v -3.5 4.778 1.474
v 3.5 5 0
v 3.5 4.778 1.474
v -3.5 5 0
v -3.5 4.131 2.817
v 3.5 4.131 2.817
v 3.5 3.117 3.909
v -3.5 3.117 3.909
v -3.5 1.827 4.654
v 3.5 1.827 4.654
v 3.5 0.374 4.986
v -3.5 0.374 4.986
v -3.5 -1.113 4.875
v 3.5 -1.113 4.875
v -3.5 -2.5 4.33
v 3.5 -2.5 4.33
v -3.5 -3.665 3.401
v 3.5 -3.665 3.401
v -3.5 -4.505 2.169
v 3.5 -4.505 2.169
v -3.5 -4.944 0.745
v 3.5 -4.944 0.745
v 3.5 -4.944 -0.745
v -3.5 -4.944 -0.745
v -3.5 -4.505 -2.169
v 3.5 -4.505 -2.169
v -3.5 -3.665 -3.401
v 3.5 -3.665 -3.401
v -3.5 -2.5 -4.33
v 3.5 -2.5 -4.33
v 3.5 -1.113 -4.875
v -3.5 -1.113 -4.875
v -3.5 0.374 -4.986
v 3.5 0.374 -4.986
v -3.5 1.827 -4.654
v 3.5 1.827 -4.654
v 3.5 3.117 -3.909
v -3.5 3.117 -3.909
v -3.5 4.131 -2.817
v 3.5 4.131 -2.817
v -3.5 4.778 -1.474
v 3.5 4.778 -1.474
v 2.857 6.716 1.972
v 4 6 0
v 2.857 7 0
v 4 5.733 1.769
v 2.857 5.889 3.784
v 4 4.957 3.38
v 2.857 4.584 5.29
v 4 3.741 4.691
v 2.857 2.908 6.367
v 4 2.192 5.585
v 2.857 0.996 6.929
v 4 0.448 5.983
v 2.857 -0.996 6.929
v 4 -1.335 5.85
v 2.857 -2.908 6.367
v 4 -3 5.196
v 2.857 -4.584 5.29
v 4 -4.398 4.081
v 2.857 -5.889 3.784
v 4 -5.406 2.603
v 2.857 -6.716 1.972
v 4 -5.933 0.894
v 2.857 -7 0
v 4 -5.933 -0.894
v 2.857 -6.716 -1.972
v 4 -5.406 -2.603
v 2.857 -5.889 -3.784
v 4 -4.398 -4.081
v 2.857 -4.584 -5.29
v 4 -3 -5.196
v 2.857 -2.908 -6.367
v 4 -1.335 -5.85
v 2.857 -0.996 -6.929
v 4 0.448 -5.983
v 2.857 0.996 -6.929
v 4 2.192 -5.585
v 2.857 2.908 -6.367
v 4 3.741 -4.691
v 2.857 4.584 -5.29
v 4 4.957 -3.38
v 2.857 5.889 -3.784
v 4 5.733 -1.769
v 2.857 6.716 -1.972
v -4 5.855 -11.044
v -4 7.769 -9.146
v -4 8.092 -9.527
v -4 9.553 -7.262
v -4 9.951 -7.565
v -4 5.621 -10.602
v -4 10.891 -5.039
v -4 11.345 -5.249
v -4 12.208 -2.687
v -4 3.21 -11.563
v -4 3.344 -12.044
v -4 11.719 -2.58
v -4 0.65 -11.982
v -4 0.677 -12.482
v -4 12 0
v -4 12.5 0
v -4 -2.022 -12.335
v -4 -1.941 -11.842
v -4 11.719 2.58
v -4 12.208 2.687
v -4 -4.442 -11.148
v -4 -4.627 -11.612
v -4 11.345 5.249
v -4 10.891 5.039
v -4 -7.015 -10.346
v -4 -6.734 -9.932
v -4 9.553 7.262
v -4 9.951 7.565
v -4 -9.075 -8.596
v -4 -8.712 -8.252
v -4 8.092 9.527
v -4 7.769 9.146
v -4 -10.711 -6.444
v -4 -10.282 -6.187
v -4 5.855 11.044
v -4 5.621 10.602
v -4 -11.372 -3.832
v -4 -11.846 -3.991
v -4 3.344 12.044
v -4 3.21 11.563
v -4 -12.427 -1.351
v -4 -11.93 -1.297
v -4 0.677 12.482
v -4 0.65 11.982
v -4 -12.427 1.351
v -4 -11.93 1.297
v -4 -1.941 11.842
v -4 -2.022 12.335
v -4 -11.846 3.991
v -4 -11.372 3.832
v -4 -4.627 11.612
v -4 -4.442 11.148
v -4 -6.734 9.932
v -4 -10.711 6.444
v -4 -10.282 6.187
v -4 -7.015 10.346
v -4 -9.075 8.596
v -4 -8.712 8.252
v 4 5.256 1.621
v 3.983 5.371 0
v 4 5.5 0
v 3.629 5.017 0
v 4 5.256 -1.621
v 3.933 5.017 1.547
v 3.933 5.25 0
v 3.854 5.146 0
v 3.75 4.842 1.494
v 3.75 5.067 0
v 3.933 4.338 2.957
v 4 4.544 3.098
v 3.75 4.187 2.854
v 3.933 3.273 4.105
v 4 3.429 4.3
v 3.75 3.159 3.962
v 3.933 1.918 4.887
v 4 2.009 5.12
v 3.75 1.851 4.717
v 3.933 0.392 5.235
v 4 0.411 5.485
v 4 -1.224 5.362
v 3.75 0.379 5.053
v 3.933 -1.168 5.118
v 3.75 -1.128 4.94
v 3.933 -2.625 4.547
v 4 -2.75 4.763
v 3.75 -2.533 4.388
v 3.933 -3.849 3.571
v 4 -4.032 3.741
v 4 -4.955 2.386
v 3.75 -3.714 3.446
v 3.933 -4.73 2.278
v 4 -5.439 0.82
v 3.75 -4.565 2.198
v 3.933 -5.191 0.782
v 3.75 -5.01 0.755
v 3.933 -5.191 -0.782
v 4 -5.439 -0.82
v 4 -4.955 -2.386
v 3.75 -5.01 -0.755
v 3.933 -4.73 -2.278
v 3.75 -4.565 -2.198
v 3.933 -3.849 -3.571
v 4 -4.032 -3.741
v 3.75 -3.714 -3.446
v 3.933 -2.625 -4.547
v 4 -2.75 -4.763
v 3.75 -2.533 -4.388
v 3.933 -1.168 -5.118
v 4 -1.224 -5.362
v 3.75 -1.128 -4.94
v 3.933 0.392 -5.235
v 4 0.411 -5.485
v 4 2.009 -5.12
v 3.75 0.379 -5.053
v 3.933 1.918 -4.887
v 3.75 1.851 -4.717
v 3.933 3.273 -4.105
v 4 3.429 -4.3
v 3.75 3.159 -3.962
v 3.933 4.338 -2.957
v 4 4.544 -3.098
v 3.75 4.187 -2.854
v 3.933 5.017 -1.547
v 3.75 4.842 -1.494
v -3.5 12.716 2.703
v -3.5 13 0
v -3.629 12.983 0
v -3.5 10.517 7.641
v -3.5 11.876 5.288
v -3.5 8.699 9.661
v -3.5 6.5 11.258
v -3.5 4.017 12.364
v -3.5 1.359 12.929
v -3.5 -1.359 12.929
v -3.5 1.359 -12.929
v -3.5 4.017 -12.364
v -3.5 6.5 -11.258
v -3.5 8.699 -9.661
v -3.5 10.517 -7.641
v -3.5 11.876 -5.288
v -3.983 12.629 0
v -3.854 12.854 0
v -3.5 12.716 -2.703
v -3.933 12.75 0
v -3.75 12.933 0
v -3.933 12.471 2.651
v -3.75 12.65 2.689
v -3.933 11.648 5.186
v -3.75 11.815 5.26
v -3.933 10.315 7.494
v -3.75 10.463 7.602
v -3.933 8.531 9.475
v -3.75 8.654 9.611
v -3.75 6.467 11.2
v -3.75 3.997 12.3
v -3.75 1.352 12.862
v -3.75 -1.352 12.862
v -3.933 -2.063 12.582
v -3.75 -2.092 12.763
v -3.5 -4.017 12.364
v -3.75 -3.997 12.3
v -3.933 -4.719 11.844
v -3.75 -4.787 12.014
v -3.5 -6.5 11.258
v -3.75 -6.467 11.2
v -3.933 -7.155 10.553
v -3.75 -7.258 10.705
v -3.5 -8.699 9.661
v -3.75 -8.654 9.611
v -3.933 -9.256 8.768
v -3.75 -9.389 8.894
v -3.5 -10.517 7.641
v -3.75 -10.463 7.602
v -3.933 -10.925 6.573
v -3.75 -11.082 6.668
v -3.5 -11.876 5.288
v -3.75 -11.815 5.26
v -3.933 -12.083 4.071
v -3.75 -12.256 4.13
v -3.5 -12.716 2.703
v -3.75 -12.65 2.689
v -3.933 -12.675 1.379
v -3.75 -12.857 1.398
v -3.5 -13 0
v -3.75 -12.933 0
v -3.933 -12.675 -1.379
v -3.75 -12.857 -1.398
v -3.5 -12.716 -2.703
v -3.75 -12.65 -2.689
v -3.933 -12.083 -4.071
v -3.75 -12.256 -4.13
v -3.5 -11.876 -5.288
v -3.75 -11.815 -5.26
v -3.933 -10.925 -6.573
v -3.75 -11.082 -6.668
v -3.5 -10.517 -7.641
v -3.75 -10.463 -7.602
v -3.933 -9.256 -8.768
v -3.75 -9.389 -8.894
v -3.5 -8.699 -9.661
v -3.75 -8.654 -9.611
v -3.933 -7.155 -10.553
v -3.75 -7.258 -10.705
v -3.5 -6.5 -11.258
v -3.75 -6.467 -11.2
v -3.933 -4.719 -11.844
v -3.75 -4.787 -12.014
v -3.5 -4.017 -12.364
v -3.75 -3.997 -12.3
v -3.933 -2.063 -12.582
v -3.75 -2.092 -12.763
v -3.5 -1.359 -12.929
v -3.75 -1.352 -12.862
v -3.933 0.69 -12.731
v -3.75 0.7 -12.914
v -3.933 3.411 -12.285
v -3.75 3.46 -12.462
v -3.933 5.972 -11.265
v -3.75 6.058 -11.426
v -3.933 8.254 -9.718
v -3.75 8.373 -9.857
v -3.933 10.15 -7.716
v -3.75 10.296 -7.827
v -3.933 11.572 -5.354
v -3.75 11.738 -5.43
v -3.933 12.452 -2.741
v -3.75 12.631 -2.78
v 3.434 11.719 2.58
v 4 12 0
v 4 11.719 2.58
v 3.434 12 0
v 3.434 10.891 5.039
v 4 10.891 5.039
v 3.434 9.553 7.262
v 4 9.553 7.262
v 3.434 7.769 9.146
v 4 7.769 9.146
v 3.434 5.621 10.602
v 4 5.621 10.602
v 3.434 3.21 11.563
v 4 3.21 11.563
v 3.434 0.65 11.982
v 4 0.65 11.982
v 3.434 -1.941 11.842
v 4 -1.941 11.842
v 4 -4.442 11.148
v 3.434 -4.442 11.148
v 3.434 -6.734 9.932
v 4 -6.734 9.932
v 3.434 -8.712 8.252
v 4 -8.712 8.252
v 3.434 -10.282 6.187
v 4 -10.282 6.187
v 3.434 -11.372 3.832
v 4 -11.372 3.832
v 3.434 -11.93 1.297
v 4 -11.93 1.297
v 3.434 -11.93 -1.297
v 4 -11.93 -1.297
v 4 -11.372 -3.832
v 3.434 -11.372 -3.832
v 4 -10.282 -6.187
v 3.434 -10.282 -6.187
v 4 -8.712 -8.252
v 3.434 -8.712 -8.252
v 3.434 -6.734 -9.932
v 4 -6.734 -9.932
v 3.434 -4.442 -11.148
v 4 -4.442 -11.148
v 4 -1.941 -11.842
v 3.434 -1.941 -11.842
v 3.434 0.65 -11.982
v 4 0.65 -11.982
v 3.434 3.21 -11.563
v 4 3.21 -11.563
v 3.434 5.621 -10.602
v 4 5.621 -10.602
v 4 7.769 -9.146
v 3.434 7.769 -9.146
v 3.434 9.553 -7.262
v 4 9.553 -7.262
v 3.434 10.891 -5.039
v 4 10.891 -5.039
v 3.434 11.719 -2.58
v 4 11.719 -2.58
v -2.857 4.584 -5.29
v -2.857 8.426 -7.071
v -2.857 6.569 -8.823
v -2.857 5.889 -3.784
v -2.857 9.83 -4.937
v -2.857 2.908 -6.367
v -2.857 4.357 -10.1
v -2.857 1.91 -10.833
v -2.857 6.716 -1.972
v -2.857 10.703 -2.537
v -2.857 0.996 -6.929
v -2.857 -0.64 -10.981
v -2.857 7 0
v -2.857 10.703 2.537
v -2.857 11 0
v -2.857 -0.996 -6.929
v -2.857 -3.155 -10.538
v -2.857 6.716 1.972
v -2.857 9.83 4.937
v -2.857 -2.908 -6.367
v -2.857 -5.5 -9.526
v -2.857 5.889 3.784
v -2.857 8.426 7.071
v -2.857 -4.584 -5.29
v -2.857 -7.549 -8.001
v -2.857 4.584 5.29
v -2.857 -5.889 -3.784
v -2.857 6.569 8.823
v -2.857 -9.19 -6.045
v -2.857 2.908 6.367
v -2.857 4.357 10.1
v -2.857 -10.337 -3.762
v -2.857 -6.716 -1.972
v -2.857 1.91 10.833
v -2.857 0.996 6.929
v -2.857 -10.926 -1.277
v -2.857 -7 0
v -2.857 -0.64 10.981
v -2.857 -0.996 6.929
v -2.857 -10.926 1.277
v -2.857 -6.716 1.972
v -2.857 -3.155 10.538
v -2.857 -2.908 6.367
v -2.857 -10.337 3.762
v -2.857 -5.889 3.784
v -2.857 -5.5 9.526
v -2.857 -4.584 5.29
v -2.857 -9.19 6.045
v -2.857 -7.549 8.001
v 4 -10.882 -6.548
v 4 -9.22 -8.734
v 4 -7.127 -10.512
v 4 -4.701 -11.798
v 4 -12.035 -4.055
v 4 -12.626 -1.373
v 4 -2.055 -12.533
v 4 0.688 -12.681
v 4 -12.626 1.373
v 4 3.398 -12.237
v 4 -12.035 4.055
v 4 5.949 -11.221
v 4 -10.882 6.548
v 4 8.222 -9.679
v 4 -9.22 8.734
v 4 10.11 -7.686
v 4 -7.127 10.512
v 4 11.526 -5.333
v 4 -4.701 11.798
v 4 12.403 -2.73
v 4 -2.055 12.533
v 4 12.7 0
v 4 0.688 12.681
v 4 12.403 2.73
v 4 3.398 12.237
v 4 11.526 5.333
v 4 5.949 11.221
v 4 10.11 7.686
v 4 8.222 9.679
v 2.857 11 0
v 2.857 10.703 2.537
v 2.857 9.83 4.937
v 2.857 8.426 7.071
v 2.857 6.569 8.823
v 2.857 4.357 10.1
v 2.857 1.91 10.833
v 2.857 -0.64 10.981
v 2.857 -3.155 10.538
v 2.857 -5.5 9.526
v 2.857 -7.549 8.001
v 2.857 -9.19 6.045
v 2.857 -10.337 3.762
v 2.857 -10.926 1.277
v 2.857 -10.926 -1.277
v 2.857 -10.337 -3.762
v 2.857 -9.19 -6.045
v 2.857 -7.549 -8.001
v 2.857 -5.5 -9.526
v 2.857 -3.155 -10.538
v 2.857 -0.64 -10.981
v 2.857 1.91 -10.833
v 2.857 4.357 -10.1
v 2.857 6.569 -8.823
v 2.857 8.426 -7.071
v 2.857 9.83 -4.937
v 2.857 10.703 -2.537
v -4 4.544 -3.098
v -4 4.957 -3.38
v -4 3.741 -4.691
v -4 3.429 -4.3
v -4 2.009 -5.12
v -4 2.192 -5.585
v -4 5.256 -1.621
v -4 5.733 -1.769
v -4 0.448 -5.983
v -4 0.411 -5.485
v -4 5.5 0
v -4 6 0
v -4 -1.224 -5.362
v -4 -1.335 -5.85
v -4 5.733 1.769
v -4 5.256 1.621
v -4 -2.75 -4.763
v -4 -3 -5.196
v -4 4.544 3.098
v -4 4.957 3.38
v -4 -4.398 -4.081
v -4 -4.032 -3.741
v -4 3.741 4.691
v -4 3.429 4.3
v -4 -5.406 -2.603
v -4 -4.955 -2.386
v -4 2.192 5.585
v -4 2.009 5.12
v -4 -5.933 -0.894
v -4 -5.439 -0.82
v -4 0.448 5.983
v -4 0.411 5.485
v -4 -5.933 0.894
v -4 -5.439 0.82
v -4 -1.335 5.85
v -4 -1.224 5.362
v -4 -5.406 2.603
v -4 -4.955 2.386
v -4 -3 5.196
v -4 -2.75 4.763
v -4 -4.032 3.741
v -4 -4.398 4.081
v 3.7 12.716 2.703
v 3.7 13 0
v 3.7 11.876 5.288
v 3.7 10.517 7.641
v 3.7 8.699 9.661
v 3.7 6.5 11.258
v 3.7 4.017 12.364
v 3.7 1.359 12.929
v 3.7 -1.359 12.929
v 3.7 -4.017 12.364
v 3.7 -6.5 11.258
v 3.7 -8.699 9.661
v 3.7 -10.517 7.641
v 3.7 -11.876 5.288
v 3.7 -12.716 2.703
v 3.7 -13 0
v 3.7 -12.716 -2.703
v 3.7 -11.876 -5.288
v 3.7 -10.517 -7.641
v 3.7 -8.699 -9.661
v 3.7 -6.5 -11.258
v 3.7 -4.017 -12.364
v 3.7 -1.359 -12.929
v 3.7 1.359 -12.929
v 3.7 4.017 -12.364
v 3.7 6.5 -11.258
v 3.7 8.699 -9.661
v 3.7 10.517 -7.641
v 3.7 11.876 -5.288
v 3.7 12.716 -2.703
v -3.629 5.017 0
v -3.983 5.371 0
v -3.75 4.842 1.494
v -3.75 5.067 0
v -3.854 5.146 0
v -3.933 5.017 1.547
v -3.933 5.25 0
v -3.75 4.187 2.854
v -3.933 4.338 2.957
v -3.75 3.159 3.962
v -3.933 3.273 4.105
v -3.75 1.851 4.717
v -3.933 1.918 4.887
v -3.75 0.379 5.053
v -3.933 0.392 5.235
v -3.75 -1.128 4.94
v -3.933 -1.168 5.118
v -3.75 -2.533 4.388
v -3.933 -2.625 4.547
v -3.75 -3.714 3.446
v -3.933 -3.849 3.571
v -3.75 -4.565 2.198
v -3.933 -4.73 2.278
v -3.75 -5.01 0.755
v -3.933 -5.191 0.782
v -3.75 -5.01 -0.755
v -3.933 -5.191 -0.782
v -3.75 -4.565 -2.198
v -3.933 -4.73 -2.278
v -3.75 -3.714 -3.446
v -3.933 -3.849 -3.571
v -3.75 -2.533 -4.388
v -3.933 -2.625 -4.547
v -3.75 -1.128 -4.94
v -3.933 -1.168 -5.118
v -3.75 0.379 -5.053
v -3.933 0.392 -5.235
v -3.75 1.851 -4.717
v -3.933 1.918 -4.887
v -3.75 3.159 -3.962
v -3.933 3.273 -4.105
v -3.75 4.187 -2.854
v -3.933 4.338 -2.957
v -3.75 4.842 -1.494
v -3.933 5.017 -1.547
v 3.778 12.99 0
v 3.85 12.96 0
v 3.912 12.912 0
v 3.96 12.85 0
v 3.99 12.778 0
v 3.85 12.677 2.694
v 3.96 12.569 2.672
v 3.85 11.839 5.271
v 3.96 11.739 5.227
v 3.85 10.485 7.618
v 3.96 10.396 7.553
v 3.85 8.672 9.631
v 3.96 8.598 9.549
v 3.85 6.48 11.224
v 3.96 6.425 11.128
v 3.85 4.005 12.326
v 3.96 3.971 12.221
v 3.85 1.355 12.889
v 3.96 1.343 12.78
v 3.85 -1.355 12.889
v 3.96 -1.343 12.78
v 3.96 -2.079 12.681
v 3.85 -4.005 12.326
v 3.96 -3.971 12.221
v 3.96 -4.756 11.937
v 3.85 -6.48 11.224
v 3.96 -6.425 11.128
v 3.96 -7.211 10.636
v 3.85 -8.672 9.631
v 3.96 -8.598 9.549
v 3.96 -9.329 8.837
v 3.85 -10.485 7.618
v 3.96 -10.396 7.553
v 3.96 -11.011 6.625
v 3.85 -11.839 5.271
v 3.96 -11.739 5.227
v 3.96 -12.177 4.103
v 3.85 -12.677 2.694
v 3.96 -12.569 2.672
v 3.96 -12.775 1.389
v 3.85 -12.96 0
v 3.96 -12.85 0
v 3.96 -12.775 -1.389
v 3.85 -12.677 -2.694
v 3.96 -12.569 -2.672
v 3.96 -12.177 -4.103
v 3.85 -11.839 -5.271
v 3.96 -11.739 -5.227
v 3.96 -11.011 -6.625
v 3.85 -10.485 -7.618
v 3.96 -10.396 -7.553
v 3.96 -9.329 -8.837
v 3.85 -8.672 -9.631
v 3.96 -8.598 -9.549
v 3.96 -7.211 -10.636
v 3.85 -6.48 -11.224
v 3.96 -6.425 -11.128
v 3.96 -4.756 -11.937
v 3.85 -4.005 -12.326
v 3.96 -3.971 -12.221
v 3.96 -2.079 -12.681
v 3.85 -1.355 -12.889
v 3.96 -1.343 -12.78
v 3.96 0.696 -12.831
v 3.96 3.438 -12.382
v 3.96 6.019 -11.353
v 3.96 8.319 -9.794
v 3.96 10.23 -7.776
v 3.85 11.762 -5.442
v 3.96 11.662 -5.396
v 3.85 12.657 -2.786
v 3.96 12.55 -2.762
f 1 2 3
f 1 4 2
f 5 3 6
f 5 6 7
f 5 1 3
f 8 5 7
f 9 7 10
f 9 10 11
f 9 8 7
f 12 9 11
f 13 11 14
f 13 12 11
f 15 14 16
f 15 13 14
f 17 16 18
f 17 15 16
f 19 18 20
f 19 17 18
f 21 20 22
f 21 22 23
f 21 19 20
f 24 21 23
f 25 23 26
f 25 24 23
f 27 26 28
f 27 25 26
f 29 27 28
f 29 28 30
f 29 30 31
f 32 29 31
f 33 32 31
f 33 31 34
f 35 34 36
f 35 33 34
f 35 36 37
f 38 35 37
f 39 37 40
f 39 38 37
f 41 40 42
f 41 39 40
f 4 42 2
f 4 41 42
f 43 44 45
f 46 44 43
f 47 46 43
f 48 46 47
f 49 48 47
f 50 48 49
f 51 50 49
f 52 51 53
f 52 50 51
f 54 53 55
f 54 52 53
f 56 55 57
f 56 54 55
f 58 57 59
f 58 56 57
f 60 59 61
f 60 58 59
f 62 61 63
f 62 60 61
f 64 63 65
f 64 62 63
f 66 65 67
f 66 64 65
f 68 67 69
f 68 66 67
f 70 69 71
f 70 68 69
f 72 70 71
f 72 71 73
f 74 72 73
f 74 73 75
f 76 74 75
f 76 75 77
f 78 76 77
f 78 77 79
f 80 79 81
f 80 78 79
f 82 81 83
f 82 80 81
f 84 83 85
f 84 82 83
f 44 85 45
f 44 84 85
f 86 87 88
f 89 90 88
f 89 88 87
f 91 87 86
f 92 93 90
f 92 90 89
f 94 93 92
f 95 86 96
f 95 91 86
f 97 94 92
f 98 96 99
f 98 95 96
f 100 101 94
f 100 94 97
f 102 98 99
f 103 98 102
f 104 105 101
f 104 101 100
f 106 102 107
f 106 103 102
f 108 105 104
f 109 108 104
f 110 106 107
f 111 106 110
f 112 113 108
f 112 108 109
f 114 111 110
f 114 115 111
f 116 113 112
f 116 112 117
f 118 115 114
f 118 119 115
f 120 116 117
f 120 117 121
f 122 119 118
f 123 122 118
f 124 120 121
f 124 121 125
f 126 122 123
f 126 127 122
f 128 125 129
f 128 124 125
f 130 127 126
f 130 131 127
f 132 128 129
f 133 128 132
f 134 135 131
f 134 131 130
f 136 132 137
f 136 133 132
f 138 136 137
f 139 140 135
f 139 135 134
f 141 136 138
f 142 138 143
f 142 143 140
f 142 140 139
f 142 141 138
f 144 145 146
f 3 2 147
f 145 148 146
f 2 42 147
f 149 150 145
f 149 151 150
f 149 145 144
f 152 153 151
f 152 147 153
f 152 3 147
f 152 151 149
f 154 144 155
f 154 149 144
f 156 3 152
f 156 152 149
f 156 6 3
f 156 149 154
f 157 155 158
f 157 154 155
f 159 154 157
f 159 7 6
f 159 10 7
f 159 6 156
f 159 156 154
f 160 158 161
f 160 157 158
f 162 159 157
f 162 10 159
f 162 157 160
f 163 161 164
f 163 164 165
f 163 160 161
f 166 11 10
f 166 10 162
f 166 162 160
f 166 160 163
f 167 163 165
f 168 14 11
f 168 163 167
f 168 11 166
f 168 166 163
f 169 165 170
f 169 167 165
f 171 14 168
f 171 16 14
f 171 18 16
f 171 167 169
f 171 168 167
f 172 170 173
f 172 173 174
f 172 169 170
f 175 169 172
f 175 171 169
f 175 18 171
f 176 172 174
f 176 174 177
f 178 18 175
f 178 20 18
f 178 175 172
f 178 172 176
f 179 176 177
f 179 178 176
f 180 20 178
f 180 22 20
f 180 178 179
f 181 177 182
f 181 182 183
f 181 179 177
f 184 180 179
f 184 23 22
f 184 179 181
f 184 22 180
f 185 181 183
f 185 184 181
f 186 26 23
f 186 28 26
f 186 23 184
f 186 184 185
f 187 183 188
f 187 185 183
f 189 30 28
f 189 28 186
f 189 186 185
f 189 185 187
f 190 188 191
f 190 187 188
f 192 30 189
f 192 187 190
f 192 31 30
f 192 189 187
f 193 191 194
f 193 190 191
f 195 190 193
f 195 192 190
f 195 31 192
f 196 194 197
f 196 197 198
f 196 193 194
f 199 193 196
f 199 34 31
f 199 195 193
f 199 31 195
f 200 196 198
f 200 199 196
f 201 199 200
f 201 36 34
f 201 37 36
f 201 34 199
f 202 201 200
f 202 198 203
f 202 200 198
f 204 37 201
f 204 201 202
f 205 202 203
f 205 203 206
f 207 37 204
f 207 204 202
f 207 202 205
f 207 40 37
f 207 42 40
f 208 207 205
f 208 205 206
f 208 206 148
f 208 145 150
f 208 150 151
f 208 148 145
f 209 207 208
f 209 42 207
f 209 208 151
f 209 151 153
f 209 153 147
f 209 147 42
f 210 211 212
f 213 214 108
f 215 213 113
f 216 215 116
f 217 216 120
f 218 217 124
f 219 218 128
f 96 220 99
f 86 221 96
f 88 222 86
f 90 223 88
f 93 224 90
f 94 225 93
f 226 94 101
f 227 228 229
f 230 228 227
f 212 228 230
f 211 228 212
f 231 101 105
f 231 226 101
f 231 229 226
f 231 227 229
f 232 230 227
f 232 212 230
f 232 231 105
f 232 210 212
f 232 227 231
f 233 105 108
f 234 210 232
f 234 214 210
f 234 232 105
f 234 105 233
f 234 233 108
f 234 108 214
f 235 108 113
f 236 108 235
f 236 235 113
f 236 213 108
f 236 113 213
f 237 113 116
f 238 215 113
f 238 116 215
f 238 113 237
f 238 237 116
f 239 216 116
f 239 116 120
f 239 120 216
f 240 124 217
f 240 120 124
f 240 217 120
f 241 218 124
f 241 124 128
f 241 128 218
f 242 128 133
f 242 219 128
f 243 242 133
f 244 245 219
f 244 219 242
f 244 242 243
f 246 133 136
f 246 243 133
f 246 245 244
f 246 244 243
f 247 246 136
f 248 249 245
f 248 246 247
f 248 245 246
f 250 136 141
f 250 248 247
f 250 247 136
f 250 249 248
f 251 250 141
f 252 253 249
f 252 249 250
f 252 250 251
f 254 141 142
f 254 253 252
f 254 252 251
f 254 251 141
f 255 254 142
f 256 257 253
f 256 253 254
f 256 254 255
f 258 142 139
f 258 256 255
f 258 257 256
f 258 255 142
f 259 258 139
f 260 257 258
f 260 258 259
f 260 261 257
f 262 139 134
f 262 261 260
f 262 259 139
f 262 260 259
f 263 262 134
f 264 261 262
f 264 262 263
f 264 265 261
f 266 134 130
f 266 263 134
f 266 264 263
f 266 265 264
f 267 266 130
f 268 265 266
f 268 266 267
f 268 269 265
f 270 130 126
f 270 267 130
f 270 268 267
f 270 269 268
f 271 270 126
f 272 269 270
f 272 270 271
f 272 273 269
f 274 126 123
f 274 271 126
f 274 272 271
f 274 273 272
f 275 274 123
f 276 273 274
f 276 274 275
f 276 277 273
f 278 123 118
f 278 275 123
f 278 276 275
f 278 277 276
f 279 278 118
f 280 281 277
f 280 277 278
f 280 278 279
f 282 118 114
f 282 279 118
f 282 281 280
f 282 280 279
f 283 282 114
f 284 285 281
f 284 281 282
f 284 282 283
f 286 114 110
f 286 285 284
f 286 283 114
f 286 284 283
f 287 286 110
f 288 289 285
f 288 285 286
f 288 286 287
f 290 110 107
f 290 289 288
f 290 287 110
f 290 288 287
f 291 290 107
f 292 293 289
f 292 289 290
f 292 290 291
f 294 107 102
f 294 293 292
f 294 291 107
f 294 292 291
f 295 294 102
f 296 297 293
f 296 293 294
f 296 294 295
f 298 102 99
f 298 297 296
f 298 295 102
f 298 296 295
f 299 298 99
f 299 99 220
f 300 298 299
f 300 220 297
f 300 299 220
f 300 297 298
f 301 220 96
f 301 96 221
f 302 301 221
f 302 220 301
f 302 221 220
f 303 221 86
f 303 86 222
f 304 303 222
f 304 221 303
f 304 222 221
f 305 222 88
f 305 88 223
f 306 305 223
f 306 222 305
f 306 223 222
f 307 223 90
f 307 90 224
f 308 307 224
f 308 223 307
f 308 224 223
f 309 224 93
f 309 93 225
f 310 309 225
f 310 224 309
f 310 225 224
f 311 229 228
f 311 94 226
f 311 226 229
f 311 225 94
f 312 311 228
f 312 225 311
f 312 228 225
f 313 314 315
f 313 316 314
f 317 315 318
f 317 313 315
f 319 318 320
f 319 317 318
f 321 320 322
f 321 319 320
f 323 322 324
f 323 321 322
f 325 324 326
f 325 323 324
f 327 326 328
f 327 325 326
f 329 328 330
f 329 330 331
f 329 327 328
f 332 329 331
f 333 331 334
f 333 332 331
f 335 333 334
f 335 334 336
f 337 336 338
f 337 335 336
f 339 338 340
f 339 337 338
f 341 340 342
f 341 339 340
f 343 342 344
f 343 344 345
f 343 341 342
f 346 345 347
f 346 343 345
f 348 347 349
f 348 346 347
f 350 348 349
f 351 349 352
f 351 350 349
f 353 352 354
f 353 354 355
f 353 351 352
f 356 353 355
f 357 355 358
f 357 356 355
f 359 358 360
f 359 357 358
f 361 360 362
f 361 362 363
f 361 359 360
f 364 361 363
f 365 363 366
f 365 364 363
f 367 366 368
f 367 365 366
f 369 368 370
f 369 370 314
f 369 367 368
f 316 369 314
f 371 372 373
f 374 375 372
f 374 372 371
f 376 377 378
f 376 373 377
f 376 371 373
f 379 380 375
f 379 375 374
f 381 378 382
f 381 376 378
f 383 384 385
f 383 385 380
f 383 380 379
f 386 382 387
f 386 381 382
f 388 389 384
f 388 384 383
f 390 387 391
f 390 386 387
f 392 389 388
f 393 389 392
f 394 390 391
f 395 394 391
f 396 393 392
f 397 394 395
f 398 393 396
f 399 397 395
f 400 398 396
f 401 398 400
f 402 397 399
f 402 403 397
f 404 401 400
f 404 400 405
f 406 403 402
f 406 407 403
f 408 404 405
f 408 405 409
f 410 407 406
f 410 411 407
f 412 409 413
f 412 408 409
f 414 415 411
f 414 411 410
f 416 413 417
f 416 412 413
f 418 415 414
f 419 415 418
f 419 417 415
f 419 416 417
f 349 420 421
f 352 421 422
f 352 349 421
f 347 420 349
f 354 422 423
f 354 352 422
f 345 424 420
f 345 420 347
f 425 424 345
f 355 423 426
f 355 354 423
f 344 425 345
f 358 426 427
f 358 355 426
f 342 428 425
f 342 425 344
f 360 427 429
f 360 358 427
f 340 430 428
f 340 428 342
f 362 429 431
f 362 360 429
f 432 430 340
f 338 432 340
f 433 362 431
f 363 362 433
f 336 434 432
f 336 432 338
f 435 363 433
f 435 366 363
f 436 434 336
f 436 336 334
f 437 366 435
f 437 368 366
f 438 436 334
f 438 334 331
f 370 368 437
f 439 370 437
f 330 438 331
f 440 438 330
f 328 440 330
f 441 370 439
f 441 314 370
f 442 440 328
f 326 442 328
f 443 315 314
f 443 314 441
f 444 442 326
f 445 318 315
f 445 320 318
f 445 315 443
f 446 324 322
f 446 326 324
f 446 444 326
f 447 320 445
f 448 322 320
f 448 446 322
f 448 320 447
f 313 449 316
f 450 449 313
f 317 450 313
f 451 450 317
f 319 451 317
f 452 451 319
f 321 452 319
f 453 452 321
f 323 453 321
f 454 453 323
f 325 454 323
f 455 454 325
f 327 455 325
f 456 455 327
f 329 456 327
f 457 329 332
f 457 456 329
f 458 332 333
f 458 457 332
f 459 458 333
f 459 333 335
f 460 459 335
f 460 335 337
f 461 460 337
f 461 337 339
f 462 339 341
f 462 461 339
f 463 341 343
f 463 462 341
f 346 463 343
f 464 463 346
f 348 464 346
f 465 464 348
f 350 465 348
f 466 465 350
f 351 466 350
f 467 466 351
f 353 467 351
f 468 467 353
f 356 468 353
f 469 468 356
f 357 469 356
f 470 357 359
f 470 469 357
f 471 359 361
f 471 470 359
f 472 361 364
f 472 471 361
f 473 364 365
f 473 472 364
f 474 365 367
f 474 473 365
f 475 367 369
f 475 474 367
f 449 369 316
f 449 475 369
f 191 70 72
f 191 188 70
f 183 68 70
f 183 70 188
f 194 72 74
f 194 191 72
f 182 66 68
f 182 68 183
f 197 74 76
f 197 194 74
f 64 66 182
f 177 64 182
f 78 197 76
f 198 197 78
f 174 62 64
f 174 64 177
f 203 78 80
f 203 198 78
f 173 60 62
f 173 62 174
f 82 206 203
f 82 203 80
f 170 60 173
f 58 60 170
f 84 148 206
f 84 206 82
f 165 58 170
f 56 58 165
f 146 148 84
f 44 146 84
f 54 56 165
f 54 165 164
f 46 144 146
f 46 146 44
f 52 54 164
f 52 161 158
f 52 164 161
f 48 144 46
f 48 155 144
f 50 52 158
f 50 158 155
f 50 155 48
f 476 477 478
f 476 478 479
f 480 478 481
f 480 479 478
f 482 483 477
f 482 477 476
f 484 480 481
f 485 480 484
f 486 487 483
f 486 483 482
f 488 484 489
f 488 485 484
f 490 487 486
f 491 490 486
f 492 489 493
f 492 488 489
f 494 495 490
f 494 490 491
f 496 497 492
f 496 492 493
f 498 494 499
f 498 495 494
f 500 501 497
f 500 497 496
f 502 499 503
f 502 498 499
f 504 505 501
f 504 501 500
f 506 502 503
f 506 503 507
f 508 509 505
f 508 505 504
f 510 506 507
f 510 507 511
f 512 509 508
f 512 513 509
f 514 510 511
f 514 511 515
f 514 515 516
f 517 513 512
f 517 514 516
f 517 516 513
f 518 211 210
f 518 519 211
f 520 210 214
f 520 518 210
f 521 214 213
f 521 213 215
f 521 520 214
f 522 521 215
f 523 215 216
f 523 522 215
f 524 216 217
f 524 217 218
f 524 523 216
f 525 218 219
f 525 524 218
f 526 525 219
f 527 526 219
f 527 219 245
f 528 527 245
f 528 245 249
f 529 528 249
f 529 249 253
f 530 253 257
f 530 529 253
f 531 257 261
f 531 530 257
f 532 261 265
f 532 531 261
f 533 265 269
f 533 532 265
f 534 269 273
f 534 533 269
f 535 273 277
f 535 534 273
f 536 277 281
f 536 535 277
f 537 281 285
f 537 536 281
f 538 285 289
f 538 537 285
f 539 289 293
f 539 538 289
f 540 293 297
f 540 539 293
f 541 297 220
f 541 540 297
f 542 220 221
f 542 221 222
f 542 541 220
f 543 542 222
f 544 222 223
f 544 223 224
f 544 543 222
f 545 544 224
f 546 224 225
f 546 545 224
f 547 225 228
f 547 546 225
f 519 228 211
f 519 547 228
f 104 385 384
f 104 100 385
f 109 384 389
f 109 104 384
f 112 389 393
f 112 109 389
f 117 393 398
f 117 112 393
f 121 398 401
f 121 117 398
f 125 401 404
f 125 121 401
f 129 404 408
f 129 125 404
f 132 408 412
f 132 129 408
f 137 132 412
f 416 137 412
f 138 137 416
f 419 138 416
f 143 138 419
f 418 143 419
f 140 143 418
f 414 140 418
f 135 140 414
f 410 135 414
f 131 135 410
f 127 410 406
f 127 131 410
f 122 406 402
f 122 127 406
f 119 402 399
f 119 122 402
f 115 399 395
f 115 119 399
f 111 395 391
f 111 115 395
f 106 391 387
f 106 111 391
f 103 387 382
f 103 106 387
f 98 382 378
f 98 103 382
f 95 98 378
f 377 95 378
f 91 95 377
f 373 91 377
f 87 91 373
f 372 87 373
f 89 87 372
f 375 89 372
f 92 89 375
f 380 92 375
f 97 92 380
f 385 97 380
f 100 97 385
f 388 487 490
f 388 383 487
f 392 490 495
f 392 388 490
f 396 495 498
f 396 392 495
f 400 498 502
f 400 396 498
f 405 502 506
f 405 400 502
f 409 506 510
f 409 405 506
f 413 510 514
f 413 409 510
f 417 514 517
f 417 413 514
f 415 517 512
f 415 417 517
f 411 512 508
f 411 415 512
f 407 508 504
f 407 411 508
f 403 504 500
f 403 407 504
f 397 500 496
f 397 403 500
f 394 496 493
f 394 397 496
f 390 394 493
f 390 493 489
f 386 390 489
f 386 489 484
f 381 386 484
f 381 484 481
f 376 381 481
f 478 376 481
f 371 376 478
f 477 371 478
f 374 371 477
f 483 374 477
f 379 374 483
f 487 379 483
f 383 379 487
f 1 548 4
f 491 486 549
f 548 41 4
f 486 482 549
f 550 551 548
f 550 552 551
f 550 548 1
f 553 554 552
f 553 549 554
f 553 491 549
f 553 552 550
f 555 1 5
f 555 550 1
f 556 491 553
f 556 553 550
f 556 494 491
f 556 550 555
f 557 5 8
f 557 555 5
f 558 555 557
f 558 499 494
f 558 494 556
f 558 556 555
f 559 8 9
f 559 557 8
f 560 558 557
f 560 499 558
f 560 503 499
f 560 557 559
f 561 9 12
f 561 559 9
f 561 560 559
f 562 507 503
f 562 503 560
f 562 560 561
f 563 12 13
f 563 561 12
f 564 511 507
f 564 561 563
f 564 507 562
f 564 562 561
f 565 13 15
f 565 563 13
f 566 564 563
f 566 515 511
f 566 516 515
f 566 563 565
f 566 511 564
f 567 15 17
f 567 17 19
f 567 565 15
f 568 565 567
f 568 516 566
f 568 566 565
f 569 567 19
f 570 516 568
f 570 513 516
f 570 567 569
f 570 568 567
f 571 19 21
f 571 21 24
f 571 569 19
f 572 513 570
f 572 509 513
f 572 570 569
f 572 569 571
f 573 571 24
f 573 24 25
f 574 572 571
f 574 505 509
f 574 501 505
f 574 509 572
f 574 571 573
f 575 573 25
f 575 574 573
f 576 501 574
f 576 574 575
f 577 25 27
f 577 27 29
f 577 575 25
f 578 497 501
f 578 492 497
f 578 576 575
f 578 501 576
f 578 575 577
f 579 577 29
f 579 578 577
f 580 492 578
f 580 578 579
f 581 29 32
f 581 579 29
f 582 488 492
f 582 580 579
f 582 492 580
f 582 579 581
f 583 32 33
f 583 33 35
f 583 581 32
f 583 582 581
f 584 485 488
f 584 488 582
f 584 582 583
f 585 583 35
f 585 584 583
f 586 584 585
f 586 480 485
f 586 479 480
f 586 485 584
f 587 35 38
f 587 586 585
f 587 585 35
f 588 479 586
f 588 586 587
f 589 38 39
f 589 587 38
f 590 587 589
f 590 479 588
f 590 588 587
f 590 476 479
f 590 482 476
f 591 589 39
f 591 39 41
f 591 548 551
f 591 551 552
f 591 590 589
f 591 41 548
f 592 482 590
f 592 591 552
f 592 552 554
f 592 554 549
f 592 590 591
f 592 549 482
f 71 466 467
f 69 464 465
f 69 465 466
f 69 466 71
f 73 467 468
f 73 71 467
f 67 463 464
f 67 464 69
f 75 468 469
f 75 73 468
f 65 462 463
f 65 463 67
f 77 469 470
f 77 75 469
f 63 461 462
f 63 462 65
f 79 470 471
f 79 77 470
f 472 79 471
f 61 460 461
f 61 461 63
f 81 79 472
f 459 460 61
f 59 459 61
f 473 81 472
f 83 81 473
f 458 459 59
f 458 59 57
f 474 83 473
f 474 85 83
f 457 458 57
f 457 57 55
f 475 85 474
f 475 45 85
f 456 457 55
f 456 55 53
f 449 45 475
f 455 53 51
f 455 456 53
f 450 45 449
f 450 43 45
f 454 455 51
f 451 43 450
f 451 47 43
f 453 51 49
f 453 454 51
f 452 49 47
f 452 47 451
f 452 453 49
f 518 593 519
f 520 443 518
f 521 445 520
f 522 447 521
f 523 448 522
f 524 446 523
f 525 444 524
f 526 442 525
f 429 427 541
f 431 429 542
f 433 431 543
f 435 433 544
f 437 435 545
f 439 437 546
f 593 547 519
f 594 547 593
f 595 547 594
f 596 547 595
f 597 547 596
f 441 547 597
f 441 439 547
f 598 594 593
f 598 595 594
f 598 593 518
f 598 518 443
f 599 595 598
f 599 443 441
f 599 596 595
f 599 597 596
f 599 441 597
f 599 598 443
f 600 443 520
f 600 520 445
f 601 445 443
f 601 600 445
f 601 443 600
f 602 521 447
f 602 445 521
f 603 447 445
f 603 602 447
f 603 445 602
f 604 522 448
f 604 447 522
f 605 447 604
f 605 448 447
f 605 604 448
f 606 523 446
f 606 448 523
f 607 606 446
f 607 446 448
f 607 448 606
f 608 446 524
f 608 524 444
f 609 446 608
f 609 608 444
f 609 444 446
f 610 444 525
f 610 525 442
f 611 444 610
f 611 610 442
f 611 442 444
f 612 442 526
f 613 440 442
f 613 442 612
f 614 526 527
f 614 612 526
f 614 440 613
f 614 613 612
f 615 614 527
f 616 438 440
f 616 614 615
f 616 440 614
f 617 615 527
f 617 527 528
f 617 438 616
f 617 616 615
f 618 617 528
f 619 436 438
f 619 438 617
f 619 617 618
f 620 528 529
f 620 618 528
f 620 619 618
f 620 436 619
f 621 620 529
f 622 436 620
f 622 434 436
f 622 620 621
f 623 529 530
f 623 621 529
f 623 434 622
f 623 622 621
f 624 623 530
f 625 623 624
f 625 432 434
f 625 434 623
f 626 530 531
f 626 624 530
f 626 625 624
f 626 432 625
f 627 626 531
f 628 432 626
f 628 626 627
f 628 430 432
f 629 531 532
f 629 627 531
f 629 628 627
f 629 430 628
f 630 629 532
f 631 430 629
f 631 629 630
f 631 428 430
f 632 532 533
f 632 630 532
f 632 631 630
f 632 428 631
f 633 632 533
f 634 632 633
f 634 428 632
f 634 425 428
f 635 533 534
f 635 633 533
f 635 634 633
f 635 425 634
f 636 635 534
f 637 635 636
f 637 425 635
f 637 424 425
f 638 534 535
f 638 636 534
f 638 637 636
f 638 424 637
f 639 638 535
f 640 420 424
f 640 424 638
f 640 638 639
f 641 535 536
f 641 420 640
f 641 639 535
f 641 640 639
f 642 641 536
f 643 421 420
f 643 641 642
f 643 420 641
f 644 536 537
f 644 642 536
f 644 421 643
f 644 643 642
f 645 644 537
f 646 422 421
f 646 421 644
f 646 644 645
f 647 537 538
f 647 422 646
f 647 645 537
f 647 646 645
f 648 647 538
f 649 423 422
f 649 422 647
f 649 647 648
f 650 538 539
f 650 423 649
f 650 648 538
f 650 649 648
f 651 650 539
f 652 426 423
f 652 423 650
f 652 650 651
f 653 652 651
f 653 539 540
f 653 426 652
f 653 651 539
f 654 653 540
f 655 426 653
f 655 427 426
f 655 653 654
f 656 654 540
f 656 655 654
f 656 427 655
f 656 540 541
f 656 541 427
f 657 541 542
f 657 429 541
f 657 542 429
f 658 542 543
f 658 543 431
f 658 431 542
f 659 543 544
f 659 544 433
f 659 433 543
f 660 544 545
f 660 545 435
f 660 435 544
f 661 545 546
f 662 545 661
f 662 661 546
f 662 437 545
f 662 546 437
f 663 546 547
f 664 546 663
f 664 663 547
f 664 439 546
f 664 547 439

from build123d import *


with BuildPart() as part:
    # Эскиз1 → Повернуть1 (revolve)
    with BuildSketch(Plane.XY):
        with BuildLine():
            Line((-3.5, 13), (3.7, 13))
            ThreePointArc((3.7, 13), (3.912132034, 12.912132034), (4, 12.7))
            Line((4, 12.7), (4, 12))
            Line((4, 12), (3.434493126, 12))
            Line((3.434493126, 12), (2.857142857, 11))
            Line((2.857142857, 11), (2.857142857, 7))
            Line((2.857142857, 7), (4, 6))
            Line((4, 6), (4, 5.5))
            ThreePointArc((4, 5.5), (3.853553391, 5.146446609), (3.5, 5))
            Line((3.5, 5), (-3.5, 5))
            ThreePointArc((-3.5, 5), (-3.853553391, 5.146446609), (-4, 5.5))
            Line((-4, 5.5), (-4, 6))
            Line((-4, 6), (-2.857142857, 7))
            Line((-2.857142857, 7), (-2.857142857, 11))
            Line((-2.857142857, 11), (-4, 12))
            Line((-4, 12), (-4, 12.5))
            ThreePointArc((-4, 12.5), (-3.853553391, 12.853553391), (-3.5, 13))
        make_face()
    revolve(axis=Axis((-1000, 0, 0), (1, 0, 0)))


solid = part.part
